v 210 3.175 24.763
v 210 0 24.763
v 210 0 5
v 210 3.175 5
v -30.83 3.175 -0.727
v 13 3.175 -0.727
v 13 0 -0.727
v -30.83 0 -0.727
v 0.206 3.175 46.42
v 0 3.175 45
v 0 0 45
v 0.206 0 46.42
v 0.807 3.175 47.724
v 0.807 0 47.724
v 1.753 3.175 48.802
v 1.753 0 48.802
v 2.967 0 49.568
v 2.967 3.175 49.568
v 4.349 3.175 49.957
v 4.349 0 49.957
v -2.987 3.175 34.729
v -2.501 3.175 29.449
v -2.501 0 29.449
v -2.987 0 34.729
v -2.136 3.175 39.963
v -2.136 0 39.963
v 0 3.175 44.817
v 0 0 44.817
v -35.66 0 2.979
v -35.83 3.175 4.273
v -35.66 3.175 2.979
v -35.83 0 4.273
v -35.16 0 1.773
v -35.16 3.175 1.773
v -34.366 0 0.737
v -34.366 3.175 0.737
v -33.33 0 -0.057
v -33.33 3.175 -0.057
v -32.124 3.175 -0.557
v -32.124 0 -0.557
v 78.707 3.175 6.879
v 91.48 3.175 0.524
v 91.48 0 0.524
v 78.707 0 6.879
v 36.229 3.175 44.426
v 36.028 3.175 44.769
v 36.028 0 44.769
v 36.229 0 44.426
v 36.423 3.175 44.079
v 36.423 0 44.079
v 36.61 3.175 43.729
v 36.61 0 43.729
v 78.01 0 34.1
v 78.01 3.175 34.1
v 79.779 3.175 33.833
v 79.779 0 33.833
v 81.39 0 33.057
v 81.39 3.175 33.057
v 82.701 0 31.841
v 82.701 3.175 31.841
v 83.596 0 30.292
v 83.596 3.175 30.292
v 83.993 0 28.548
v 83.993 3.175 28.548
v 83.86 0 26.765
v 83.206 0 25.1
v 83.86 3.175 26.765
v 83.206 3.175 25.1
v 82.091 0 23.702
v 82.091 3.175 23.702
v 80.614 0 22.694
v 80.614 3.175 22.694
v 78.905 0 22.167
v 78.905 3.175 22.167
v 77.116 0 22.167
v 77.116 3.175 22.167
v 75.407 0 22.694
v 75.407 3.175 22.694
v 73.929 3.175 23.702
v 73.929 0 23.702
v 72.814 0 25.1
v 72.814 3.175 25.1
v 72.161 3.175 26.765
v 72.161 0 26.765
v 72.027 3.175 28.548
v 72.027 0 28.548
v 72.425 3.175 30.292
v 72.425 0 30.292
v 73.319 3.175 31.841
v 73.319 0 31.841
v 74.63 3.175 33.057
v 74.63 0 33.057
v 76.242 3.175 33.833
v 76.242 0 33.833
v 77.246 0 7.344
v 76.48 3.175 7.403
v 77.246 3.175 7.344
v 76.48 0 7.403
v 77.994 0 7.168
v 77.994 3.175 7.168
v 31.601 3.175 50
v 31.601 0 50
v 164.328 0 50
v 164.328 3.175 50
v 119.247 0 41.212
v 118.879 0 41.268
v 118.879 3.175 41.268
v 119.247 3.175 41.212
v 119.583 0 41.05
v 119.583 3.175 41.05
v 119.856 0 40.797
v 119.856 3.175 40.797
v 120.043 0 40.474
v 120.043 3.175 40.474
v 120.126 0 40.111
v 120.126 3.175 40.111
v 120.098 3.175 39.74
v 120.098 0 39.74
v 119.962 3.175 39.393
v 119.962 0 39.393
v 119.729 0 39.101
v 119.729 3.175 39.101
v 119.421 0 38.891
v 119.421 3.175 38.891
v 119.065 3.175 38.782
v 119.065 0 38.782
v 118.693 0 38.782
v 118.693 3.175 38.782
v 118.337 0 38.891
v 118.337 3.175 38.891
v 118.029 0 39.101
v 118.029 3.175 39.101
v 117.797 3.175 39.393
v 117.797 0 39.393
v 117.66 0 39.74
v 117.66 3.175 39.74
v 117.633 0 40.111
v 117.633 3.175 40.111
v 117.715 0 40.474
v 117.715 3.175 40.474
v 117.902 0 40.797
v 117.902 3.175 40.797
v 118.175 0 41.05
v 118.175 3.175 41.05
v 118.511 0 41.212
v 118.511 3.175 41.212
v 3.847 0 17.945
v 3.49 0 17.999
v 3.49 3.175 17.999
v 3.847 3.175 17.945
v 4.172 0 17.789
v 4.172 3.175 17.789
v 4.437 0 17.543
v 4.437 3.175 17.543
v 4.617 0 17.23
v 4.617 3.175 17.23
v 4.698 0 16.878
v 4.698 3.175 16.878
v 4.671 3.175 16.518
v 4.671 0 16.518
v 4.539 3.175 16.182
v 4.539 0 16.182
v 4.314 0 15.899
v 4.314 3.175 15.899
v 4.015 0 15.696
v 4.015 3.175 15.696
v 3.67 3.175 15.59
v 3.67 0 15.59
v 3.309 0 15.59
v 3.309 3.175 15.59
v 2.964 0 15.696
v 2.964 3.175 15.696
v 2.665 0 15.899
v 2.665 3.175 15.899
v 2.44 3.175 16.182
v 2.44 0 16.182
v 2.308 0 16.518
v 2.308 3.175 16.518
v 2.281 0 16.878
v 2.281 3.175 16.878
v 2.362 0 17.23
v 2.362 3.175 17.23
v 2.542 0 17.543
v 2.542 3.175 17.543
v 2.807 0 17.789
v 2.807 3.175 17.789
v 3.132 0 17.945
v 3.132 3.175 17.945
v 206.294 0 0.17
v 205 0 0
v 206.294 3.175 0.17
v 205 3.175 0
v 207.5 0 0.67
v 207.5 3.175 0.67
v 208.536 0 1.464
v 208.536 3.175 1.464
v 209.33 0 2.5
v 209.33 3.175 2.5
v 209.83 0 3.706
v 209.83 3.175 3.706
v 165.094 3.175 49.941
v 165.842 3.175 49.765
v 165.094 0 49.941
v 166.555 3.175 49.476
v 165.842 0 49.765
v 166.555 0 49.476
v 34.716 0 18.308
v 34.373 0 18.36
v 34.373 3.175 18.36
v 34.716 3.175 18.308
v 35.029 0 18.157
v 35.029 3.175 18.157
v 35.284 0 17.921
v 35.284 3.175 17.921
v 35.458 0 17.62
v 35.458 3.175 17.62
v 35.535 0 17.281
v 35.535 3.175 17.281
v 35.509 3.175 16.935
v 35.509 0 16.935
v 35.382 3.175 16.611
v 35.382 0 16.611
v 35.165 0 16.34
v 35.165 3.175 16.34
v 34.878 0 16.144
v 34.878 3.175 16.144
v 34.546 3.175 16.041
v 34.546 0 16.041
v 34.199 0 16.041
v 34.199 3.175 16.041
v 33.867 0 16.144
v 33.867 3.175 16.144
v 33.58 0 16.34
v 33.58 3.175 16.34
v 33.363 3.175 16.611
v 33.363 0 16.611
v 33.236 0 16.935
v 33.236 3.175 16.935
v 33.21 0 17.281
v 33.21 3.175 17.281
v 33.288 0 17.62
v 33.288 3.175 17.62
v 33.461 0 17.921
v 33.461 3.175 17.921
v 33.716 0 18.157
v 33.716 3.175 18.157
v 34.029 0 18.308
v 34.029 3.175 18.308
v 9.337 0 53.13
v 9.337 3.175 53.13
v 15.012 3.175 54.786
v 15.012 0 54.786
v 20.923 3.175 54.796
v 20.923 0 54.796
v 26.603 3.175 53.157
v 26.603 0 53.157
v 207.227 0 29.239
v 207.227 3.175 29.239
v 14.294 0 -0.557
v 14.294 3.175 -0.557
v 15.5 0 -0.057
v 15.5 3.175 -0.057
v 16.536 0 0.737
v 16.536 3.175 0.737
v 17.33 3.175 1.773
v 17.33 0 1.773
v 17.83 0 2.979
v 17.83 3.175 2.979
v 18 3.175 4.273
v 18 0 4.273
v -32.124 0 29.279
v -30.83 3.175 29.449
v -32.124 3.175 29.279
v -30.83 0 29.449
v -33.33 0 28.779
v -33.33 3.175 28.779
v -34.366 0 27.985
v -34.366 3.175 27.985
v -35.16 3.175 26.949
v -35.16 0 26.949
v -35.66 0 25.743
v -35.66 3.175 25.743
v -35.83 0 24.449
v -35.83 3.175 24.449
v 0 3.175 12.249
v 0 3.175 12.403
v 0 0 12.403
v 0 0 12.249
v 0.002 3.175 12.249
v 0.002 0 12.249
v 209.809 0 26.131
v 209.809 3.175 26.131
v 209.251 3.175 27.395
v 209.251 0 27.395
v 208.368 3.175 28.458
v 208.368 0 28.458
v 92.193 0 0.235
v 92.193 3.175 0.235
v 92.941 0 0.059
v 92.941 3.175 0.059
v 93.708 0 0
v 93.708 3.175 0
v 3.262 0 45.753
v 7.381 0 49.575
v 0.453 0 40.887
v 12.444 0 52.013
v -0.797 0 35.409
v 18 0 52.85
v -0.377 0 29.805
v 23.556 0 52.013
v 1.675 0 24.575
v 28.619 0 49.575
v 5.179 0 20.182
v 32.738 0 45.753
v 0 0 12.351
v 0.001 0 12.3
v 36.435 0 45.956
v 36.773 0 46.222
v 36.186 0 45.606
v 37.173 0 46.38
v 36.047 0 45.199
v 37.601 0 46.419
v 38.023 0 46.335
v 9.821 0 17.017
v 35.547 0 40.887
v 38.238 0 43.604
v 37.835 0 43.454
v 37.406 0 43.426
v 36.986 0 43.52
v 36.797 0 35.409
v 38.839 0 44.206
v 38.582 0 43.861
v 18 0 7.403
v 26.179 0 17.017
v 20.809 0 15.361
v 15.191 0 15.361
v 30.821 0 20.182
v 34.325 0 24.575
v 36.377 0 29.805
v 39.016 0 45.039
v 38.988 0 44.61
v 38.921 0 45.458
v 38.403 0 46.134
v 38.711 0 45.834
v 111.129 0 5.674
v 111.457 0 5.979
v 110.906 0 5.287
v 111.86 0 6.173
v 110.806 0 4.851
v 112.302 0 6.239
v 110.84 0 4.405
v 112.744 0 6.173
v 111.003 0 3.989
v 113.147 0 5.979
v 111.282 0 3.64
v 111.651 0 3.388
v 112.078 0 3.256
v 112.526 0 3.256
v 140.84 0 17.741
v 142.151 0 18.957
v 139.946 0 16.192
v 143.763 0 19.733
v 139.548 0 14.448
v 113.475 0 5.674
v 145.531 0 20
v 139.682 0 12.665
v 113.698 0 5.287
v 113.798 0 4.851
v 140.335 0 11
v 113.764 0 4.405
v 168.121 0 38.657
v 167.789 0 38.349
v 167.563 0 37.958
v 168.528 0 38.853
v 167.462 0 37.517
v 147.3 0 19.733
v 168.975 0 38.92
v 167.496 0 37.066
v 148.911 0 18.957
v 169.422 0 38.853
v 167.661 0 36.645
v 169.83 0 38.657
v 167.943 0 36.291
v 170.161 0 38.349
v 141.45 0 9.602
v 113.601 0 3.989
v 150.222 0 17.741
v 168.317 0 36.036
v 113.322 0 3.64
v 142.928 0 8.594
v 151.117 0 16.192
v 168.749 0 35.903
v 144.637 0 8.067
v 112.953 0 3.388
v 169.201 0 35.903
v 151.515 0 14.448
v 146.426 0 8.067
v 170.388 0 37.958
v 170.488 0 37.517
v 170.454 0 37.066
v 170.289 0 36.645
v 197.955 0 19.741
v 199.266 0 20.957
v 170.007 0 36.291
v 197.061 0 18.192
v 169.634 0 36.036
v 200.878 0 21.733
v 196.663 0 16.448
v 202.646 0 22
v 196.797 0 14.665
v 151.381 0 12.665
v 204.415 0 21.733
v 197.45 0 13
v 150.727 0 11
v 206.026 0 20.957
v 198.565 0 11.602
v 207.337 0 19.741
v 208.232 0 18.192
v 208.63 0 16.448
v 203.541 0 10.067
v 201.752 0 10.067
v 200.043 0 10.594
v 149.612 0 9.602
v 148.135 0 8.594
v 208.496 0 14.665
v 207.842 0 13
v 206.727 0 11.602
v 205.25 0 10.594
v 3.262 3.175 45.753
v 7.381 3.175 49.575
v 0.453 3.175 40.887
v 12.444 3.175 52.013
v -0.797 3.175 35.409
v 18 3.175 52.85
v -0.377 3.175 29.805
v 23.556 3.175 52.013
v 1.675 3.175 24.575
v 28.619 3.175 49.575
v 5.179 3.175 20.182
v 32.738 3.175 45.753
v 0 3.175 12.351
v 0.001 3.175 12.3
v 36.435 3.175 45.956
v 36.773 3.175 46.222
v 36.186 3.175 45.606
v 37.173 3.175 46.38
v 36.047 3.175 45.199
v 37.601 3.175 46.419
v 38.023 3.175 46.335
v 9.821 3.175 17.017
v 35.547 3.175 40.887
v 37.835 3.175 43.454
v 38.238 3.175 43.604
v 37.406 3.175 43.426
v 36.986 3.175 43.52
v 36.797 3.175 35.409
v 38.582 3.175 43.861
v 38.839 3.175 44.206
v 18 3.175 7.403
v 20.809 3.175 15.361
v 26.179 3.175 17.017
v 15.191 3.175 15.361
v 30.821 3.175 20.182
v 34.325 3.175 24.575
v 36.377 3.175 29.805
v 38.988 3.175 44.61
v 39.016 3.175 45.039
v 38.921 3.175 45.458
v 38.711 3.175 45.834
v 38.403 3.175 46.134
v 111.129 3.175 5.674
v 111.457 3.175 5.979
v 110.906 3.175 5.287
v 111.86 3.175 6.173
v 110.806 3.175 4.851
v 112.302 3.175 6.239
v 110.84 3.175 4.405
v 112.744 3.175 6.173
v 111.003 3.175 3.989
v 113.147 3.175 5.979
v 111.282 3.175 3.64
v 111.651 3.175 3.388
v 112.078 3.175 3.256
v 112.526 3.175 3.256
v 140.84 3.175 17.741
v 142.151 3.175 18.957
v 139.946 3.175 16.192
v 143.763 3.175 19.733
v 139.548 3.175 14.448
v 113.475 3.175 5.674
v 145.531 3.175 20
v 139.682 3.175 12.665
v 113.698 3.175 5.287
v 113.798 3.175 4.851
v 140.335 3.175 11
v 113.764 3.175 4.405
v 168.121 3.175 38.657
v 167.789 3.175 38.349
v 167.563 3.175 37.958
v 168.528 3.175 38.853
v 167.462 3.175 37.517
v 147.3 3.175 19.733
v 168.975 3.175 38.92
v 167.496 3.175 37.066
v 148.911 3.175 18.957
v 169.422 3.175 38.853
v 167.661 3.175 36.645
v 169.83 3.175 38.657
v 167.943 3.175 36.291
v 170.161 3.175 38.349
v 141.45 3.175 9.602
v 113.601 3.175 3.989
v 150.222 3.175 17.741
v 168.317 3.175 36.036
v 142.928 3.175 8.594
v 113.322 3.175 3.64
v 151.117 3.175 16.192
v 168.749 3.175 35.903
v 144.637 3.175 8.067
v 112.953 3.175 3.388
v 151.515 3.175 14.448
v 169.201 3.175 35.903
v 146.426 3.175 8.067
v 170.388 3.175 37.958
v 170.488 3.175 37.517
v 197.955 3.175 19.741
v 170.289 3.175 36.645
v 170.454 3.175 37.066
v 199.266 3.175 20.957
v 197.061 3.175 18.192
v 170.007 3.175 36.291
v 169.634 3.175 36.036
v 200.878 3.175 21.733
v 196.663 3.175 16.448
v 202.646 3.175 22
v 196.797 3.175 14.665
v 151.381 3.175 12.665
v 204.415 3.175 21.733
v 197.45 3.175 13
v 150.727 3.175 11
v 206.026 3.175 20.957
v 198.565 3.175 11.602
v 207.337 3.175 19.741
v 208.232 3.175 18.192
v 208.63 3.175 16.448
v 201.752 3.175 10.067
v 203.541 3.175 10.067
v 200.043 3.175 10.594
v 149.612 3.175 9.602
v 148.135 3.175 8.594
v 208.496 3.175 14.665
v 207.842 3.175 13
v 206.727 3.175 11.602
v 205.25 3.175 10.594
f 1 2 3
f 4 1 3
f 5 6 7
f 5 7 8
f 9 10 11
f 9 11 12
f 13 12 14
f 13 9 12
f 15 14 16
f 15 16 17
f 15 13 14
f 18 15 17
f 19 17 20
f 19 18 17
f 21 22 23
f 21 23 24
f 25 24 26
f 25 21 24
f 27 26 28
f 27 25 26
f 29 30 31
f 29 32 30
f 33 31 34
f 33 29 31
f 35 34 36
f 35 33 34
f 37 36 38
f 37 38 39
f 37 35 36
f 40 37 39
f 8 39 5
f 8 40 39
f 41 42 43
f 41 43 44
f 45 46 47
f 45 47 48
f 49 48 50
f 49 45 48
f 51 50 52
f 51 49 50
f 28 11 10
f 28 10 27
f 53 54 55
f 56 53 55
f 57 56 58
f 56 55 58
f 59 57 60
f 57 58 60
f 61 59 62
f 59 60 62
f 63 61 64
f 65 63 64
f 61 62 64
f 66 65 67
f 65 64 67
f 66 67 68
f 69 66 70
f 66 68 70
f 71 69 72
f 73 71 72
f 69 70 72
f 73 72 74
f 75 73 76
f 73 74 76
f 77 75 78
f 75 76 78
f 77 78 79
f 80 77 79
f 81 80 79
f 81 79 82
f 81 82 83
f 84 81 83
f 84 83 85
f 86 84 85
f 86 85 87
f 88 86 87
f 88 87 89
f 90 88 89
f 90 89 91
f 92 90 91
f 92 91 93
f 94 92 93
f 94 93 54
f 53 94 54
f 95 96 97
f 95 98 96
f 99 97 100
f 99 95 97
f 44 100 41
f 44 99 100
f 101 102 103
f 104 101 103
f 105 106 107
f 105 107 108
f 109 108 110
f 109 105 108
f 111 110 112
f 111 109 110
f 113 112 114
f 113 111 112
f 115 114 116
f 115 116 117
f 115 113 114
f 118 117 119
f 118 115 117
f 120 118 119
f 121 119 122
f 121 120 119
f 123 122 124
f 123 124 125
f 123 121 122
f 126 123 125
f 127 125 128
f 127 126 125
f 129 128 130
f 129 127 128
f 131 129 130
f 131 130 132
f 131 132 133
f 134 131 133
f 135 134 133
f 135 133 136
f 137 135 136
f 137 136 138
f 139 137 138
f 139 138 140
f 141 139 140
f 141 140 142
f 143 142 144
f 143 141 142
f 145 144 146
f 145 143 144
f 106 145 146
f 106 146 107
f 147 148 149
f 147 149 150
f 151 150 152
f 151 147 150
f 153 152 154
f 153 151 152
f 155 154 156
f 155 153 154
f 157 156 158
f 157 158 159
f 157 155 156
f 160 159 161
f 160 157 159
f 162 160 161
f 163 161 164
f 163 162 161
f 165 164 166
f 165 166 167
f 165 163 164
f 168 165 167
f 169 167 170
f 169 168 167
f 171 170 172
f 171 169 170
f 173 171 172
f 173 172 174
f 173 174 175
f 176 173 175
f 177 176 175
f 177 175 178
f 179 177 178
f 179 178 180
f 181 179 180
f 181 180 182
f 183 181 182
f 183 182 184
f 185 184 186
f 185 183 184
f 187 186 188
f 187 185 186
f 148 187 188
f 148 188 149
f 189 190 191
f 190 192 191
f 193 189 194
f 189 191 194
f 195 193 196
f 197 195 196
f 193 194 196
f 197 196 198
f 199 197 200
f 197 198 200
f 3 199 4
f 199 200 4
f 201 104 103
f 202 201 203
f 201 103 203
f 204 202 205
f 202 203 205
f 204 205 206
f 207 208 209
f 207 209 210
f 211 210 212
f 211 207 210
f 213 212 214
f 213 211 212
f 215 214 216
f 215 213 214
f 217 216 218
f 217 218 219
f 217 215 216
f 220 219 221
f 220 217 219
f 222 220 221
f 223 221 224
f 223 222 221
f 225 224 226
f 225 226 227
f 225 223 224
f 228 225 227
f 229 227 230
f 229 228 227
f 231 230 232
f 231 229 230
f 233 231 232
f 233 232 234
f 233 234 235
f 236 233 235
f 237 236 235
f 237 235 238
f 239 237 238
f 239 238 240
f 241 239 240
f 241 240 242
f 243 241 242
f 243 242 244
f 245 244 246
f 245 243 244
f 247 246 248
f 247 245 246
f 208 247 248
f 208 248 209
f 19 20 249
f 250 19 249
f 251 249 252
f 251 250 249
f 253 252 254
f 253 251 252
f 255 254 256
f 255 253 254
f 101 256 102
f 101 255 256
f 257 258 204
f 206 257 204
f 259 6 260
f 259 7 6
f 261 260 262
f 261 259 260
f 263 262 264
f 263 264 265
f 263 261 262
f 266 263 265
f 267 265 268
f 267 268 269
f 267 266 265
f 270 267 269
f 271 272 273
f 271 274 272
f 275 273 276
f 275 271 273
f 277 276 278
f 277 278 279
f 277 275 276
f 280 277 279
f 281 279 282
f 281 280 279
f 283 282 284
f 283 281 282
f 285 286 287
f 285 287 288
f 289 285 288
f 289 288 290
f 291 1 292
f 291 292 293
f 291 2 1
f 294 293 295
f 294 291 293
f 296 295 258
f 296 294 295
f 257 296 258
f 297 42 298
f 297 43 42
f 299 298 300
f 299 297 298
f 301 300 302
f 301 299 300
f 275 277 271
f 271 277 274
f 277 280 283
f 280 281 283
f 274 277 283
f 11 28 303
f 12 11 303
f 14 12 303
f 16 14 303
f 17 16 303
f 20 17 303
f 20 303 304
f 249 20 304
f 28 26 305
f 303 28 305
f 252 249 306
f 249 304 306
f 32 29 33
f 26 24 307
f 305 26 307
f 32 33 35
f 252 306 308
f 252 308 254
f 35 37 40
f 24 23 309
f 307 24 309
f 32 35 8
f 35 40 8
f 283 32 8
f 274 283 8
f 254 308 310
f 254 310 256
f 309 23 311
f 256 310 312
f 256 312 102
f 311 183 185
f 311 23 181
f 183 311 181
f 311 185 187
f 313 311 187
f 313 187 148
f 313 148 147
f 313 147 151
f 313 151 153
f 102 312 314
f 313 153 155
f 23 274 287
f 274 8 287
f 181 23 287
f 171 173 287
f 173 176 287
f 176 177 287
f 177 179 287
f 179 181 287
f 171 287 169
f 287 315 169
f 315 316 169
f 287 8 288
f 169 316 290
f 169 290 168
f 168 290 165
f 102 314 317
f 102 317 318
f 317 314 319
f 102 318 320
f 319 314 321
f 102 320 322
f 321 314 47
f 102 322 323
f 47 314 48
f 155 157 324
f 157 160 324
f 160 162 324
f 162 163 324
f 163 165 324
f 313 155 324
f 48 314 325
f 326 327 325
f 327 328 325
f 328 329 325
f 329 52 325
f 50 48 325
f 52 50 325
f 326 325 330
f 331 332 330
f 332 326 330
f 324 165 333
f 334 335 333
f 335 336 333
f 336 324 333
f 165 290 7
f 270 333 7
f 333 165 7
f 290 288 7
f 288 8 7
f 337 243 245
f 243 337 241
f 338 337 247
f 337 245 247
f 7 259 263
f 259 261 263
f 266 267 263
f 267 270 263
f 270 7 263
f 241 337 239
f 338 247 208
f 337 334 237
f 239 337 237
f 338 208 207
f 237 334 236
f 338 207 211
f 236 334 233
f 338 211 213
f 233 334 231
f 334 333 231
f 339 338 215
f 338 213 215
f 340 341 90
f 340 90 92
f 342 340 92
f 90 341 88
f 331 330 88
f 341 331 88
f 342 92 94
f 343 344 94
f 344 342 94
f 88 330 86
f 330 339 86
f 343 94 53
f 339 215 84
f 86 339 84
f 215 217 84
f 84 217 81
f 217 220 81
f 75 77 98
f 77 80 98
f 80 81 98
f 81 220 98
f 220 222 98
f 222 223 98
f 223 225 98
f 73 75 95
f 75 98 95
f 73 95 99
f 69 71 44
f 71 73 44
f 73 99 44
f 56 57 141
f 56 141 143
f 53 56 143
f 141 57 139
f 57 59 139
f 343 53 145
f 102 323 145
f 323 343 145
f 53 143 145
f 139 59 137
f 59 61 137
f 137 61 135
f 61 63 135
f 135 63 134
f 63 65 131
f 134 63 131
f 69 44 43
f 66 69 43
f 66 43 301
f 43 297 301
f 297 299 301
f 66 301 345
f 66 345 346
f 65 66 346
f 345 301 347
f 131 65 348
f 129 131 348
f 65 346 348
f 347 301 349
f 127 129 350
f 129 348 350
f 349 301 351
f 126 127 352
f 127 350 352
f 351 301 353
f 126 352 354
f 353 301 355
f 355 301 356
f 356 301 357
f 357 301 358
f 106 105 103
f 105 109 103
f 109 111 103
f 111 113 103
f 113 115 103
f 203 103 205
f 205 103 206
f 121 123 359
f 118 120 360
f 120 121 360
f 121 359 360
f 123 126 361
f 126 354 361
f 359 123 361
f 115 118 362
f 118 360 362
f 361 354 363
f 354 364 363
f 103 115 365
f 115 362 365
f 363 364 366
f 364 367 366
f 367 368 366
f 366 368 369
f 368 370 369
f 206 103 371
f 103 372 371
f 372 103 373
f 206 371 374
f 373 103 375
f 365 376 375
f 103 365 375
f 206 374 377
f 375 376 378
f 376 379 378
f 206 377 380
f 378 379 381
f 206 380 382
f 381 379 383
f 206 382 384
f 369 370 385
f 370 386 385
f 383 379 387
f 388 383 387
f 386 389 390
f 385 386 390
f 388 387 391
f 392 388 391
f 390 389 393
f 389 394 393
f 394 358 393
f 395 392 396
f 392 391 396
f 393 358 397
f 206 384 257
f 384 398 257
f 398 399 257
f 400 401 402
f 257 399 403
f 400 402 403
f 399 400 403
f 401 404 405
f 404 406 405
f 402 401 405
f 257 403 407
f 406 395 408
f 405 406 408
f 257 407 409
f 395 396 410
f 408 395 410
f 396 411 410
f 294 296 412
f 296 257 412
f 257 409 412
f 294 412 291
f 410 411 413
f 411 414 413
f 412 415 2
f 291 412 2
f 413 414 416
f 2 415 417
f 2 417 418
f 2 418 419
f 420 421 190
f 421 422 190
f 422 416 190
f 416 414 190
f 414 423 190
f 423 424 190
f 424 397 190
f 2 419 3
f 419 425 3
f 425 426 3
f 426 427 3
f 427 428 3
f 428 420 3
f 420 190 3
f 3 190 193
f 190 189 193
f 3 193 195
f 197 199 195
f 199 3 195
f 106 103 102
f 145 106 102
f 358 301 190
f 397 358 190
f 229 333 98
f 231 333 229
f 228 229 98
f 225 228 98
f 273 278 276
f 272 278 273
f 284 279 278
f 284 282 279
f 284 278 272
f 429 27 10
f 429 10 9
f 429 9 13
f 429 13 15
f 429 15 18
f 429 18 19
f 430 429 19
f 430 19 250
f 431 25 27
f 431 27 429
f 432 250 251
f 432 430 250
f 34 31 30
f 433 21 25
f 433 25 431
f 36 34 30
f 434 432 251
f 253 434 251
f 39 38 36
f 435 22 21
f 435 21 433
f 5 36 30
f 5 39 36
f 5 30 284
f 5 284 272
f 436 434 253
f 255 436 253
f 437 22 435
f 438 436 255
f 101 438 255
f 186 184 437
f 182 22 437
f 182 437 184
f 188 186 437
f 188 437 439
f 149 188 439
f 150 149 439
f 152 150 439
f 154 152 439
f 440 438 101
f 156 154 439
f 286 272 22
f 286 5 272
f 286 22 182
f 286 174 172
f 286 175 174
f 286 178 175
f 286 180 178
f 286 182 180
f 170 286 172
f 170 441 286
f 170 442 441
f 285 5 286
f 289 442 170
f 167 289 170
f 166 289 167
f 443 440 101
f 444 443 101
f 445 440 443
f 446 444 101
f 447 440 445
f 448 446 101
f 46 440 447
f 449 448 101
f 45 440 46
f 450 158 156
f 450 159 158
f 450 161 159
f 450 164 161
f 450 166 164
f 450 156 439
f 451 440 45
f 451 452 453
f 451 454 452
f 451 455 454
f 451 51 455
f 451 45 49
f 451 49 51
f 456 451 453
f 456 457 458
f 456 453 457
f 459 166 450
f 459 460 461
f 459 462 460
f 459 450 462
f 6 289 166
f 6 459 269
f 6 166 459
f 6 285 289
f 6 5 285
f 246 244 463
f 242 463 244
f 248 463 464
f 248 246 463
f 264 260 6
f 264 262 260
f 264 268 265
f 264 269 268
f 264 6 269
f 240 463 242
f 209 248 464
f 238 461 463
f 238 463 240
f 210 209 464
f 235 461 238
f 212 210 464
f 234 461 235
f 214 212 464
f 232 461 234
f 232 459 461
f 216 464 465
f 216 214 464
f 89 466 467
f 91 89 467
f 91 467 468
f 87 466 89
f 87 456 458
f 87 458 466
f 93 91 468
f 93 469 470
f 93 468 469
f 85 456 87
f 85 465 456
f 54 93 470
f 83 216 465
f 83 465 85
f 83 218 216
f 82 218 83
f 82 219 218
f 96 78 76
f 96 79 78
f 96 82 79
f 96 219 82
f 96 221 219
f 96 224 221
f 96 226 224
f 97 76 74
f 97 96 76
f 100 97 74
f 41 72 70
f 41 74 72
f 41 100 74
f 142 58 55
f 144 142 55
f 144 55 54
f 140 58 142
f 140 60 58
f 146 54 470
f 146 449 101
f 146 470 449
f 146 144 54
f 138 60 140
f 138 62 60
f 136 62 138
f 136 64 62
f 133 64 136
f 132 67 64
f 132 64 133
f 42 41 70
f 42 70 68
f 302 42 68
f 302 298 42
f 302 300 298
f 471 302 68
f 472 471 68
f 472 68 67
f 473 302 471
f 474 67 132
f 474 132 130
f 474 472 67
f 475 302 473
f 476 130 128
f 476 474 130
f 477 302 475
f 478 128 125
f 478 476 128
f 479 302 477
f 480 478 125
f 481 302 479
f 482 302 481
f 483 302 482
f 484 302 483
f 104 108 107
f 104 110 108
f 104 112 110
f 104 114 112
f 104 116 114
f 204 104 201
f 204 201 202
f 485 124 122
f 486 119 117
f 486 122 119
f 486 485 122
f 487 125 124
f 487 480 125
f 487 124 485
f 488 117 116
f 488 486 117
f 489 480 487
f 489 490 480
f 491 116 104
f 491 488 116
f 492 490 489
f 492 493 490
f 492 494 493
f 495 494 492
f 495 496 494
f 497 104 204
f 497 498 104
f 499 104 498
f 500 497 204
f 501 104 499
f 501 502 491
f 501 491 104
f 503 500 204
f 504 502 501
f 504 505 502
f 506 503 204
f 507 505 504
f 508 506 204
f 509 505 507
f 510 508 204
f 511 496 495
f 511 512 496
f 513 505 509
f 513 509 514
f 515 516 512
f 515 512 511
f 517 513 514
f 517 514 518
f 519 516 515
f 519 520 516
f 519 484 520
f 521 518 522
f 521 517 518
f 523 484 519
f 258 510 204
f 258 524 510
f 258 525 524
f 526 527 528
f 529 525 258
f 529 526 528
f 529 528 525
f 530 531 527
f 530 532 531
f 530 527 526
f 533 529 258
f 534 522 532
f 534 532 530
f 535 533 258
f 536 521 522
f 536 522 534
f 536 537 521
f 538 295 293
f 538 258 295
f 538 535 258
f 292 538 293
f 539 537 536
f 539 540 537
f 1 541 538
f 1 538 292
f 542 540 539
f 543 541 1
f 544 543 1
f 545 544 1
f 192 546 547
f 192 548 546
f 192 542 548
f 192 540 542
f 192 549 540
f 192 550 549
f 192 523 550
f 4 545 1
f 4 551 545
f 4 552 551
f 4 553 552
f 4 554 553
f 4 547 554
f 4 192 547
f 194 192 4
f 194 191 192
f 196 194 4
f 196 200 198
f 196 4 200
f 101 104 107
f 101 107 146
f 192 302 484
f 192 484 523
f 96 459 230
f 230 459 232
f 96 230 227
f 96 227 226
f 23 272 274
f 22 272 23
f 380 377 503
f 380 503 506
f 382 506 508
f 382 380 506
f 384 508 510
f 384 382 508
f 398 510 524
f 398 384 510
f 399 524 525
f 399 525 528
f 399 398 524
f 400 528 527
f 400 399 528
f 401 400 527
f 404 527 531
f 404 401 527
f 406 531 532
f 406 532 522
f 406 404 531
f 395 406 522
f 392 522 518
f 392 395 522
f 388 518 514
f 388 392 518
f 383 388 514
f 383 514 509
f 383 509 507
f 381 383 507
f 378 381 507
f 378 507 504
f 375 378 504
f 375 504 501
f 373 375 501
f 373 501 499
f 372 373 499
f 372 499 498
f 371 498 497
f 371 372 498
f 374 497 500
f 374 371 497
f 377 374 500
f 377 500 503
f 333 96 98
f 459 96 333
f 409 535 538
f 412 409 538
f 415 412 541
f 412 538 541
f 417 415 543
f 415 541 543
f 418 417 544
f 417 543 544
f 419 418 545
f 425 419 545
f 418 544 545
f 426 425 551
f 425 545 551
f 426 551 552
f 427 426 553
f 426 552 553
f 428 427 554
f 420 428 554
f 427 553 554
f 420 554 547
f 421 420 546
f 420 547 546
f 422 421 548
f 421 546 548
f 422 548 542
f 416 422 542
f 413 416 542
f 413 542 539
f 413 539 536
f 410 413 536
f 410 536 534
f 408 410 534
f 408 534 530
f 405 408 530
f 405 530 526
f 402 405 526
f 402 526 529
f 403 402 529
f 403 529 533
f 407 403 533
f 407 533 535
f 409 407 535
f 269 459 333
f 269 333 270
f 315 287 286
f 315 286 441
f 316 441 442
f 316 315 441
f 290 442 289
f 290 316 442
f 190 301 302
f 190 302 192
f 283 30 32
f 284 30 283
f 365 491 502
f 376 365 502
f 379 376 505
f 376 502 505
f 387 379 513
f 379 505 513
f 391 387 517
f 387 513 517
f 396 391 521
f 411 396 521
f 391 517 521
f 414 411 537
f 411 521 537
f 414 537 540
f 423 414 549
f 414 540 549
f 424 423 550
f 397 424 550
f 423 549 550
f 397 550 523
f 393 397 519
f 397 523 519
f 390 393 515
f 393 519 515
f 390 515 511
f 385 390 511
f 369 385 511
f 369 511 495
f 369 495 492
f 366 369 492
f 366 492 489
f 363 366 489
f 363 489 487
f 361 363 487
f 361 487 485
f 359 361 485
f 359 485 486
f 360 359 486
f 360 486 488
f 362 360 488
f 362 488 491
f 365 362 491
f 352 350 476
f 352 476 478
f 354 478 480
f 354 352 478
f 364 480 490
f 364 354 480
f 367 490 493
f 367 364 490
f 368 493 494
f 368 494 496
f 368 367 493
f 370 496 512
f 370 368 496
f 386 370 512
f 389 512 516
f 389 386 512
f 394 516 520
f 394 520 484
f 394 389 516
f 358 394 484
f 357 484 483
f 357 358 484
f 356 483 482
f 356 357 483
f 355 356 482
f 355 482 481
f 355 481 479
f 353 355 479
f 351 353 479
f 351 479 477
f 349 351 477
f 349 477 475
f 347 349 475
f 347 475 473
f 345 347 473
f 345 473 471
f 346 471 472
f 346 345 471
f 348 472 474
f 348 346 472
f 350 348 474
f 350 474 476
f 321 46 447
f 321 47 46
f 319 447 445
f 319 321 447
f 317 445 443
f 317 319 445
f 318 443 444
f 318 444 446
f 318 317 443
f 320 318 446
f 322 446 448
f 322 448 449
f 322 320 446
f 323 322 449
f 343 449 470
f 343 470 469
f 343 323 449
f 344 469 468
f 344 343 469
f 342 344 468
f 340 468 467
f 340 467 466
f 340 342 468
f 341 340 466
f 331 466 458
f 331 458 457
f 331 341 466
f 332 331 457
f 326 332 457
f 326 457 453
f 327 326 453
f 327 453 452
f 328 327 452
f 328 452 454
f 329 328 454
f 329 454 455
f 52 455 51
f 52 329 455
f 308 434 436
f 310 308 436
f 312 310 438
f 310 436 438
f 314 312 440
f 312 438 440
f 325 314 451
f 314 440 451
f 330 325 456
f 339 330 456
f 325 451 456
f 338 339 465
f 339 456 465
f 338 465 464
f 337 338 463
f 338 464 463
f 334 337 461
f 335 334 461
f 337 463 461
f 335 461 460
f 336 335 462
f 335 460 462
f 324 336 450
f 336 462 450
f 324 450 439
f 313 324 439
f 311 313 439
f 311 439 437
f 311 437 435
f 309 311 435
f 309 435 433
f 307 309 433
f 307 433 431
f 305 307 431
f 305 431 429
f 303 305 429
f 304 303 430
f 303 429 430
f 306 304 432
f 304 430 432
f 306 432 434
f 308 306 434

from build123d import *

# Parameters (mm, degrees)
SKETCH1_W           = 210
SKETCH1_H           = 50
SKETCH1_R           = 1.211665018
SKETCH1_R_2         = 1.165617118
SKETCH1_R_3         = 1.5
SKETCH1_R_4         = 1.25
SKETCH1_R_5         = 1.517273905
BOSS_EXTRUDE1_DEPTH = 3.175
SKETCH2_R           = 2
CUT_EXTRUDE1_DEPTH  = 10
SKETCH3_R           = 6
SKETCH3_R_2         = 0.586995366
CUT_EXTRUDE2_DEPTH  = 57.15
CUT_EXTRUDE7_DEPTH  = 10
FILLET3_R           = 5
SKETCH11_R          = 18.5
SKETCH11_R_2        = 2
BOSS_EXTRUDE4_DEPTH = 3.175
SKETCH12_R          = 21
BOSS_EXTRUDE5_DEPTH = 3.175
SKETCH13_R          = 18.85
CUT_EXTRUDE8_DEPTH  = 3.175
BOSS_EXTRUDE6_DEPTH = 3.175
FILLET4_R           = 5


with BuildPart() as part:
    # Sketch1 → Boss-Extrude1 (new body)
    with BuildSketch(Plane(origin=(0, 0, 0), x_dir=(1, 0, 0), z_dir=(0, 1, 0))):
        with Locations((105, -25)):
            Rectangle(SKETCH1_W, SKETCH1_H)
        with Locations(Location((3.489526233, -16.787661112, 0), (0, 0, 270))):
            Circle(SKETCH1_R, mode=Mode.SUBTRACT)
        with Locations(Location((34.37258772, -17.194005245, 0), (0, 0, 270))):
            Circle(SKETCH1_R_2, mode=Mode.SUBTRACT)
        with Locations(Location((37.520749958, -44.921198121, 0), (0, 0, 270))):
            Circle(SKETCH1_R_3, mode=Mode.SUBTRACT)
        with Locations(Location((118.879039361, -40.017685043, 0), (0, 0, 270))):
            Circle(SKETCH1_R_4, mode=Mode.SUBTRACT)
        with Locations(Location((112.302052499, -4.739260115, 0), (0, 0, 270))):
            Circle(SKETCH1_R_3, mode=Mode.SUBTRACT)
        with Locations(Location((168.975233936, -37.403209633, 0), (0, 0, 270))):
            Circle(SKETCH1_R_5, mode=Mode.SUBTRACT)
    extrude(amount=BOSS_EXTRUDE1_DEPTH)

    # Sketch2 → Cut-Extrude1 (cut)
    with BuildSketch(Plane(origin=(0, 3.175, 0), x_dir=(1, 0, 0), z_dir=(0, 1, 0))):
        with Locations(Location((10, -26, 0), (0, 0, 270))):
            Circle(SKETCH2_R)
        with Locations(Location((10, -42, 0), (0, 0, 270))):
            Circle(SKETCH2_R)
        with Locations(Location((26, -26, 0), (0, 0, 270))):
            Circle(SKETCH2_R)
        with Locations(Location((26, -42, 0), (0, 0, 270))):
            Circle(SKETCH2_R)
    extrude(amount=-CUT_EXTRUDE1_DEPTH, mode=Mode.SUBTRACT)

    # Sketch3 → Cut-Extrude2 (cut)
    with BuildSketch(Plane(origin=(0, 3.175, 0), x_dir=(1, 0, 0), z_dir=(0, 1, 0))):
        with Locations(Location((78.01026379, -28.1, 0), (0, 0, 270))):
            Circle(SKETCH3_R)
        with Locations(Location((145.531297368, -14, 0), (0, 0, 270))):
            Circle(SKETCH3_R)
        with Locations(Location((18, -34, 0), (0, 0, 270))):
            Circle(SKETCH3_R_2)
        with Locations(Location((202.646291021, -16, 0), (0, 0, 270))):
            Circle(SKETCH3_R)
    extrude(amount=-CUT_EXTRUDE2_DEPTH, mode=Mode.SUBTRACT)

    # Sketch10 → Cut-Extrude7 (cut)
    with BuildSketch(Plane(origin=(0, 3.175, 0), x_dir=(1, 0, 0), z_dir=(0, 1, 0))):
        Polygon((210, -27.859435908), (165.502877994, -50), (210, -50), align=None)
        Polygon((92.532613397, 0), (77.65477062, -7.402812063), (0, -7.402812063), (0, 0), align=None)
    extrude(amount=-CUT_EXTRUDE7_DEPTH, mode=Mode.SUBTRACT)

    # Fillet3
    fillet3_edges = [part.edges().sort_by_distance(p)[0] for p in [
        (210, 1.5875, 0),
        (0, 1.5875, 50),
        (92.532613397, 1.5875, 0),
        (210, 1.5875, 27.859435908),
        (165.502877994, 1.5875, 50),
        (77.65477062, 1.5875, 7.402812063),
        (0, 1.5875, 7.402812063),
    ]]
    fillet(fillet3_edges, radius=FILLET3_R)

    # Sketch11 → Boss-Extrude4 (add)
    with BuildSketch(Plane(origin=(0, 3.175, 0), x_dir=(1, 0, 0), z_dir=(0, 1, 0))):
        with Locations((18, -34)):
            Circle(SKETCH11_R)
        with Locations(Location((10, -26, 0), (0, 0, 270))):
            Circle(SKETCH11_R_2, mode=Mode.SUBTRACT)
        with Locations(Location((10, -42, 0), (0, 0, 270))):
            Circle(SKETCH11_R_2, mode=Mode.SUBTRACT)
        with Locations(Location((26, -26, 0), (0, 0, 270))):
            Circle(SKETCH11_R_2, mode=Mode.SUBTRACT)
        with Locations(Location((26, -42, 0), (0, 0, 270))):
            Circle(SKETCH11_R_2, mode=Mode.SUBTRACT)
    extrude(amount=-BOSS_EXTRUDE4_DEPTH)

    # Sketch12 → Boss-Extrude5 (add)
    with BuildSketch(Plane(origin=(0, 3.175, 0), x_dir=(1, 0, 0), z_dir=(0, 1, 0))):
        with Locations((18, -34)):
            Circle(SKETCH12_R)
    extrude(amount=-BOSS_EXTRUDE5_DEPTH)

    # Sketch13 → Cut-Extrude8 (cut)
    with BuildSketch(Plane(origin=(0, 3.175, 0), x_dir=(1, 0, 0), z_dir=(0, 1, 0))):
        with Locations(Location((18, -34, 0), (0, 0, 270))):
            Circle(SKETCH13_R)
    extrude(amount=-CUT_EXTRUDE8_DEPTH, mode=Mode.SUBTRACT)

    # Sketch14 → Boss-Extrude6 (add)
    with BuildSketch(Plane(origin=(0, 3.175, 0), x_dir=(1, 0, 0), z_dir=(0, 1, 0))):
        with BuildLine():
            Line((-35.83, -29.449062132), (-2.500950332, -29.449062132))
            ThreePointArc((-2.500950332, -29.449062132), (-1.503732803, -26.215116779), (0, -23.183346174))
            Line((0, -23.183346174), (0, -12.402812063))
            Line((0, -12.402812063), (0, -12.248529085))
            Line((0, -12.248529085), (0, 0.727187937))
            Line((0, 0.727187937), (-35.83, 0.727187937))
            Line((-35.83, 0.727187937), (-35.83, -29.449062132))
        make_face()
        with BuildLine():
            Line((0, 0.727187937), (0, -12.248529085))
            Line((0, -12.248529085), (0.002380891, -12.248529085))
            ThreePointArc((0.002380891, -12.248529085), (1.51944077, -8.813145304), (5, -7.402812063))
            Line((5, -7.402812063), (18, -7.402812063))
            Line((18, -7.402812063), (18, 0.727187937))
            Line((18, 0.727187937), (0, 0.727187937))
        make_face()
    extrude(amount=-BOSS_EXTRUDE6_DEPTH)

    # Fillet4
    fillet4_edges = [part.edges().sort_by_distance(p)[0] for p in [
        (-35.83, 1.5875, 29.449062132),
        (-35.83, 1.5875, -0.727187937),
        (18, 1.5875, -0.727187937),
    ]]
    fillet(fillet4_edges, radius=FILLET4_R)


solid = part.part
